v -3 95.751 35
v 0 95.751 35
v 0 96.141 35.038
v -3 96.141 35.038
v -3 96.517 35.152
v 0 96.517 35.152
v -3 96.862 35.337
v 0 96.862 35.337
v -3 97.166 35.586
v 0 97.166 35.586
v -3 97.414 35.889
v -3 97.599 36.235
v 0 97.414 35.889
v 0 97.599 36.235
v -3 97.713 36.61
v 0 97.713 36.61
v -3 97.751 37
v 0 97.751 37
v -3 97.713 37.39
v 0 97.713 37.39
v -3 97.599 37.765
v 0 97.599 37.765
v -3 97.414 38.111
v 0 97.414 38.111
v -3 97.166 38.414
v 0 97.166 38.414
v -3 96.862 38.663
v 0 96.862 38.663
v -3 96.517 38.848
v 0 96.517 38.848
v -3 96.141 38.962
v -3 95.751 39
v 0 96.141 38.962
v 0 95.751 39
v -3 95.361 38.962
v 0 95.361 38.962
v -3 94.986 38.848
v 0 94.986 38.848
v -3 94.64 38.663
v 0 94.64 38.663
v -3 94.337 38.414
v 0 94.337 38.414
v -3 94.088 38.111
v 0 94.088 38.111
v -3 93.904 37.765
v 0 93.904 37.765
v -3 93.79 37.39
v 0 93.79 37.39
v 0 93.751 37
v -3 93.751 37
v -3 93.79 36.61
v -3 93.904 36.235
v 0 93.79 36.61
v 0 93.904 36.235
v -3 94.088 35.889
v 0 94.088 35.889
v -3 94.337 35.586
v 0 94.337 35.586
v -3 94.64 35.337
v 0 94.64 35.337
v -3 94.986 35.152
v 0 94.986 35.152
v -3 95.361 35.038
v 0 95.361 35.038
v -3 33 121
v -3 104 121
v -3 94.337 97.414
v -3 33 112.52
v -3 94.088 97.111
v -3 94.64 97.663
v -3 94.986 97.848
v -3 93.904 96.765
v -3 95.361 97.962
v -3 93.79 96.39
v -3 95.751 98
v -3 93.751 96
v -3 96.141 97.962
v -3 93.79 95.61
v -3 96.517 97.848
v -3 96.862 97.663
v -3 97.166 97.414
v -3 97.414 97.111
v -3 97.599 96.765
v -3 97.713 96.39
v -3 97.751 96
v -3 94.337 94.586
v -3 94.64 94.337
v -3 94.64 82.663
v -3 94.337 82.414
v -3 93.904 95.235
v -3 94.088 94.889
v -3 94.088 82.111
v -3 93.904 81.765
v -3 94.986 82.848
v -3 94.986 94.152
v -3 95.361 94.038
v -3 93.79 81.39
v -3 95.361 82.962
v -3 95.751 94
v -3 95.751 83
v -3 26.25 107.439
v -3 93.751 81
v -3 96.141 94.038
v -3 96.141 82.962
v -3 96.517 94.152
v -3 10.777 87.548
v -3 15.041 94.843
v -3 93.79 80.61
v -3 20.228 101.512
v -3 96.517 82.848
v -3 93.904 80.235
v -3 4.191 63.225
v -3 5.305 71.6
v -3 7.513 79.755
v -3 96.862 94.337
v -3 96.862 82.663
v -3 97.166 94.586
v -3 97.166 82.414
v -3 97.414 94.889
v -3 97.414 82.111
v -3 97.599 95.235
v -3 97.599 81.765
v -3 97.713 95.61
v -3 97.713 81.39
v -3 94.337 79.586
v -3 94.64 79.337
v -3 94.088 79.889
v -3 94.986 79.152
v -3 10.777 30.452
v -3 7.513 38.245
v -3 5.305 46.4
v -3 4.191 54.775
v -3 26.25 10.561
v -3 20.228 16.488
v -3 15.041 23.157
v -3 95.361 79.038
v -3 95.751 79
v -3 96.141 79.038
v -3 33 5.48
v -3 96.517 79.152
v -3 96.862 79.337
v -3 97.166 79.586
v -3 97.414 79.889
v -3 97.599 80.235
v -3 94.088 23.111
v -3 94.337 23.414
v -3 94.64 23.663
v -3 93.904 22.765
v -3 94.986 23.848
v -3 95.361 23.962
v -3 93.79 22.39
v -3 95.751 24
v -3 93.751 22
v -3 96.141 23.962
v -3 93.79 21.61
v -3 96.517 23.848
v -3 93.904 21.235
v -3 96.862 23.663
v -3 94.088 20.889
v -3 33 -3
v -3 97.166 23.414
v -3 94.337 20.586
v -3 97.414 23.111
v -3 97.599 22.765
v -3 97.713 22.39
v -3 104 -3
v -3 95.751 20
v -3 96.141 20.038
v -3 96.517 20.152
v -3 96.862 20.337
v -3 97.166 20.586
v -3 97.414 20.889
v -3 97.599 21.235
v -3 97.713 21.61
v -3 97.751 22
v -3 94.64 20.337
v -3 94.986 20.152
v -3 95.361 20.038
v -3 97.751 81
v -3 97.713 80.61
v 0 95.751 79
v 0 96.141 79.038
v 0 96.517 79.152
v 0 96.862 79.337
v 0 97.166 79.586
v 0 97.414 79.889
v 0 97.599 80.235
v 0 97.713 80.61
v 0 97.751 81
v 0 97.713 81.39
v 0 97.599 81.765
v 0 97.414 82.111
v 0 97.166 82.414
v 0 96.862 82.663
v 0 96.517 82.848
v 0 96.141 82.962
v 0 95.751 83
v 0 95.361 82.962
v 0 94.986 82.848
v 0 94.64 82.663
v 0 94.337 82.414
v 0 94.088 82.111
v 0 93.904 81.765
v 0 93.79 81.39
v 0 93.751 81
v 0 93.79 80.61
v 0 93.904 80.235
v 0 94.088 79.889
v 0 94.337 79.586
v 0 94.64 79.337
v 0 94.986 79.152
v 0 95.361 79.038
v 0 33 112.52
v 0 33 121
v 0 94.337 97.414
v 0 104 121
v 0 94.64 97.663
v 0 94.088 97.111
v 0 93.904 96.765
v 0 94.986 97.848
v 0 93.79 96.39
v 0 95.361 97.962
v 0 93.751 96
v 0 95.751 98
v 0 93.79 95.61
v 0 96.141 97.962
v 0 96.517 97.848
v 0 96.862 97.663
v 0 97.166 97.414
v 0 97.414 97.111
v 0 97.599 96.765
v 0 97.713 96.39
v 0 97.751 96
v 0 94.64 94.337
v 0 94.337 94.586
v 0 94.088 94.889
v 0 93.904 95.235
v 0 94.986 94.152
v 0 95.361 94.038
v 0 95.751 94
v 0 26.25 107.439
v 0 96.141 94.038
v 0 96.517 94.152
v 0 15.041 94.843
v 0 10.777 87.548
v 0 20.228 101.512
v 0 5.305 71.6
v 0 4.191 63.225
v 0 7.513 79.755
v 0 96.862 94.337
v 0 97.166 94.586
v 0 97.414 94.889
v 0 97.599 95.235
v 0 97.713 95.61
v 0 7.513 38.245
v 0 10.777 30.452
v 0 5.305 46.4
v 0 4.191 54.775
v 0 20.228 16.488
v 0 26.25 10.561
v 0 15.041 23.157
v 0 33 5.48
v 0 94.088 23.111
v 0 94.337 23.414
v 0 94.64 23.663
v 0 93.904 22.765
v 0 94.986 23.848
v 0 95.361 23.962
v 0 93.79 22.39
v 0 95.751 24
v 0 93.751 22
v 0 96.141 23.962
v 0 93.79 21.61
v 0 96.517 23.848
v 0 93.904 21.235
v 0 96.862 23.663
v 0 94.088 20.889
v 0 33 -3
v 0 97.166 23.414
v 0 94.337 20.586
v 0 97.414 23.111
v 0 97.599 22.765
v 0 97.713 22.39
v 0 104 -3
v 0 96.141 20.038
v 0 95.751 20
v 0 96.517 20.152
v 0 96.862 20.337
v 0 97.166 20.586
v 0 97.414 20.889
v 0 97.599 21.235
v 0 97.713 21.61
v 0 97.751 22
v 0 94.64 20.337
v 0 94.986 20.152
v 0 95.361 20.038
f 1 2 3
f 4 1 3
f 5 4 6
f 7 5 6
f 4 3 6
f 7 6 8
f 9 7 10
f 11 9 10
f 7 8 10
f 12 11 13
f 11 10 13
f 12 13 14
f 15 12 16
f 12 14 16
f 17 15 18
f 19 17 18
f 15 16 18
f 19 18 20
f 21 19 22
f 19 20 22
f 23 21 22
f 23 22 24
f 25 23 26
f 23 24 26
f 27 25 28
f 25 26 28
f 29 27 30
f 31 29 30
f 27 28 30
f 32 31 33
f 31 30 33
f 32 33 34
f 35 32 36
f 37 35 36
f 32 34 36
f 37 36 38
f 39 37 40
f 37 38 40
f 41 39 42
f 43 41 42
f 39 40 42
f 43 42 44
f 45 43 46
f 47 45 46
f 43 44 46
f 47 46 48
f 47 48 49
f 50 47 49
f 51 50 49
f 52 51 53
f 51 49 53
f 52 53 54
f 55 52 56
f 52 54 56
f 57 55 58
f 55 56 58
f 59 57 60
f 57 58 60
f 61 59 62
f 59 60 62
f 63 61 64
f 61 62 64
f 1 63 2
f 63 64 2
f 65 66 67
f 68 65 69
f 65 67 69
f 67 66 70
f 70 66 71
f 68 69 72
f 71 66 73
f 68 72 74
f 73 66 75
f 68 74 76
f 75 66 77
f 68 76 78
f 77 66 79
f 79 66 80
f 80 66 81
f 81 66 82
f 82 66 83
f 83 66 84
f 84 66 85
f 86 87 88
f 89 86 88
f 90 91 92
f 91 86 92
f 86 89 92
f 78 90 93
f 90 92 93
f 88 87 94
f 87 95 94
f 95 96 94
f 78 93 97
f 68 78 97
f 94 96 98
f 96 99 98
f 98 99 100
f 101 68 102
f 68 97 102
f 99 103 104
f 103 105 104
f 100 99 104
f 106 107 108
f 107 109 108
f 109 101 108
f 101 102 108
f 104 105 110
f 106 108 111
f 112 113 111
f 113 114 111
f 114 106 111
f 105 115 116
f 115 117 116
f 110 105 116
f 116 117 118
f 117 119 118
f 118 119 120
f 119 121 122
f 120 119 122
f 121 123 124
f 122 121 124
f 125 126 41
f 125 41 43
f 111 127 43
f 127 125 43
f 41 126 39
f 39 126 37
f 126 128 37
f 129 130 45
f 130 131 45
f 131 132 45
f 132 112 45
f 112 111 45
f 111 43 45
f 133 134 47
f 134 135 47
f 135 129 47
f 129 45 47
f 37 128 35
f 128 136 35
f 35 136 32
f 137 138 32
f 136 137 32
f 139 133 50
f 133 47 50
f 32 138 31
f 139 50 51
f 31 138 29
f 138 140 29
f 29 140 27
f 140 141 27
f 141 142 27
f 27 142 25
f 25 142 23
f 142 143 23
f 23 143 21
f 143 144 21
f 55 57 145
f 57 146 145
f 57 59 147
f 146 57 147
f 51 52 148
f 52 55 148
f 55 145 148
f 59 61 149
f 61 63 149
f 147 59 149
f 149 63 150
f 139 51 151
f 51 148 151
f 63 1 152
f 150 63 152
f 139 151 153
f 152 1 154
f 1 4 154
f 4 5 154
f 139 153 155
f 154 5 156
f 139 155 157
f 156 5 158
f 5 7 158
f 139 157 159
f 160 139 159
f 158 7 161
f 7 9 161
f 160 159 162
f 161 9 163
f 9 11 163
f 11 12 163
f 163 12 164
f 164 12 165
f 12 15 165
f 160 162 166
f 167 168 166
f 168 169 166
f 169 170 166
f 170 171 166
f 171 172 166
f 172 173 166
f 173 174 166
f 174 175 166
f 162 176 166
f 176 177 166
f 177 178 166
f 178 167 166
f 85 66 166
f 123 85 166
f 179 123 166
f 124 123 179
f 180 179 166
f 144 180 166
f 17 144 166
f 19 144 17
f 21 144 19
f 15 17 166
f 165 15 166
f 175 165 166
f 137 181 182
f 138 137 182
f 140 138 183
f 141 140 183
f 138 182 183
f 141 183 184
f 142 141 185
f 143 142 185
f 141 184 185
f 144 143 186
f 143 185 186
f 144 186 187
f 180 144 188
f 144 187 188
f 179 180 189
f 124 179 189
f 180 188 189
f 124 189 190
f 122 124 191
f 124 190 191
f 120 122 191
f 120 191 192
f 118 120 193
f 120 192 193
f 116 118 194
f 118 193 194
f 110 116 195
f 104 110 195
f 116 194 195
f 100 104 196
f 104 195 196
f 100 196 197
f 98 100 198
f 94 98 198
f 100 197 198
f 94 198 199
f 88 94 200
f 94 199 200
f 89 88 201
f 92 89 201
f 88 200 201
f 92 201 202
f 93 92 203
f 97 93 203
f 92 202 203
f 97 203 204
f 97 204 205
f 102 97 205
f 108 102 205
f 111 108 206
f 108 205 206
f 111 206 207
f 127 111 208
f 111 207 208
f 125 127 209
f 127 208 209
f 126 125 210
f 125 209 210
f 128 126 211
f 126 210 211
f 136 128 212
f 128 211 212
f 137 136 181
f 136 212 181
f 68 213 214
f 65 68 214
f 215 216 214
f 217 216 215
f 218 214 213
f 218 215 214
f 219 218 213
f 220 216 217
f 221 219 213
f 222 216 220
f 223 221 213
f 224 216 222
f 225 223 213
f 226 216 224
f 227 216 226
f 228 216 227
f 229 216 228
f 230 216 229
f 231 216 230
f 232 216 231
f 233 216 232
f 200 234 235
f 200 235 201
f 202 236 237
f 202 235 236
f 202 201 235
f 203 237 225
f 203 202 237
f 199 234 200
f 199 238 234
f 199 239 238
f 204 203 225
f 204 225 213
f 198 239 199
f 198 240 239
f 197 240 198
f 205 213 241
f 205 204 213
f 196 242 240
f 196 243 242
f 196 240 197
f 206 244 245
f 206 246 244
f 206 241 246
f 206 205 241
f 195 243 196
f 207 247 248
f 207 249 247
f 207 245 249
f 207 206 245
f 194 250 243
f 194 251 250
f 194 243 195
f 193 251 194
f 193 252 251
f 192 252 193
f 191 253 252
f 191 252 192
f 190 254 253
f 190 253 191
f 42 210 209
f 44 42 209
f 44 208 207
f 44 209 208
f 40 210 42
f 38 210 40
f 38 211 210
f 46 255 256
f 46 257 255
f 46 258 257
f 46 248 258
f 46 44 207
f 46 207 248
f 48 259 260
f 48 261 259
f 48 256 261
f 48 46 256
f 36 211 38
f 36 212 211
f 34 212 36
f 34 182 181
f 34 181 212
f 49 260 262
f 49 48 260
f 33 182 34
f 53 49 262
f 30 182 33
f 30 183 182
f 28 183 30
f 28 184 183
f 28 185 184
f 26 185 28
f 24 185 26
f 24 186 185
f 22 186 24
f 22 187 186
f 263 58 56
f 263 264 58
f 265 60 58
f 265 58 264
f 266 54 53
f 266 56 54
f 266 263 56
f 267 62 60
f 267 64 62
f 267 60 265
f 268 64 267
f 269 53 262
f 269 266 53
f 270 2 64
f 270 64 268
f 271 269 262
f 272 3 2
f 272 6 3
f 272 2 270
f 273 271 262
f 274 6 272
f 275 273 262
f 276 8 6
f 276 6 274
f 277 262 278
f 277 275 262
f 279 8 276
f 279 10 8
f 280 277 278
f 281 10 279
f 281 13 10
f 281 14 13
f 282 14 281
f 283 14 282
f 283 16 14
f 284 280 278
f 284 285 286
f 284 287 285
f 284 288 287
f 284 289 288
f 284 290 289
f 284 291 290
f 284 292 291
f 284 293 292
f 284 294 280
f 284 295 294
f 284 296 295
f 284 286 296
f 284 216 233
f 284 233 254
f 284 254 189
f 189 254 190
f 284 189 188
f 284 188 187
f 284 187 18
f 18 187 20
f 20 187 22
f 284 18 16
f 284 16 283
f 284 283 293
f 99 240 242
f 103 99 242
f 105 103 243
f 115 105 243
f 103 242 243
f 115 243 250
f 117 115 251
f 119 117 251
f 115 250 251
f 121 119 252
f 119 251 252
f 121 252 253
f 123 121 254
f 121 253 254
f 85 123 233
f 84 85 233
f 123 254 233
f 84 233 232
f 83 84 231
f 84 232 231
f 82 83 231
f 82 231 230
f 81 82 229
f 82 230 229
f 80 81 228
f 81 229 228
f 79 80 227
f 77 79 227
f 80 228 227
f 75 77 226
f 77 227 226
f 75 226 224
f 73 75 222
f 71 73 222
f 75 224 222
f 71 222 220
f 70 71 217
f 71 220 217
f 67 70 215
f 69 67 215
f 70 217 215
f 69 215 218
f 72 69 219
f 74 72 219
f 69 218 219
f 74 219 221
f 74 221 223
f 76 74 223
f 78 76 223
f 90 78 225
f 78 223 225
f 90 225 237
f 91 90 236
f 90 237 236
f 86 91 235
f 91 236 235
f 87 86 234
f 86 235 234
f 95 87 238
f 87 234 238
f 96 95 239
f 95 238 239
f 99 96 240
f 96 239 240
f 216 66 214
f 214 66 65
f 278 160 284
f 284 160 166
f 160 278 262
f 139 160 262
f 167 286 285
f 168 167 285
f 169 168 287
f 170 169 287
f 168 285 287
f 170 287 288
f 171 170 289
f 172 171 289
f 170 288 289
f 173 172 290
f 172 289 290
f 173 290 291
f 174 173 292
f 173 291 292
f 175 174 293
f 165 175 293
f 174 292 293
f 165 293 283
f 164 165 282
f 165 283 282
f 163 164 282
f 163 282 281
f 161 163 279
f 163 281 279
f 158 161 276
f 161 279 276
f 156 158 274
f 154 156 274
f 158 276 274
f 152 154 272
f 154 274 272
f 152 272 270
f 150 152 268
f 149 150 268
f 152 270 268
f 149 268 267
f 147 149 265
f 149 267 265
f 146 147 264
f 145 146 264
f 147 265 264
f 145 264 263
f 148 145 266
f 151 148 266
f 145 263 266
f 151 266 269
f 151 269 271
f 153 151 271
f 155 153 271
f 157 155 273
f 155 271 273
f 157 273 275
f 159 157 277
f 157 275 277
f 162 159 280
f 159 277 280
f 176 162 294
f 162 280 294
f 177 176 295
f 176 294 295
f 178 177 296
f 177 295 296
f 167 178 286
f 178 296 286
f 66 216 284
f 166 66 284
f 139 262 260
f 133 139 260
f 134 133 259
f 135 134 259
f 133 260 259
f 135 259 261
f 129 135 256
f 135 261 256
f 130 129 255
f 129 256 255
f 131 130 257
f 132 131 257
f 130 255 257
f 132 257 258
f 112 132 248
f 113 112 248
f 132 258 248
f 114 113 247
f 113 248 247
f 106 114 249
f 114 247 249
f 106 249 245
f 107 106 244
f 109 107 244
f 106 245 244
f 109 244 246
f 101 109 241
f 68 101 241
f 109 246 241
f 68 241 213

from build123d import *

# Parameters (mm, degrees)
IMPORTED_START          = -3
IMPORTED_BODY_4_1_DEPTH = 3
SKETCH_1_R              = 2
CUT_EXTRUDE_1_DEPTH     = 3
SKETCH_2_W              = 30
SKETCH_2_H              = 3
SKETCH_2_W_2            = 3
SKETCH_2_H_2            = 30
EXTRUDE_1_DEPTH         = 3
CUT_EXTRUDE_2_DEPTH     = 3


# Read off the part's stored shape, not the designer's step: 基体零件-零件4-1
with BuildPart() as part:
    # 基体零件-零件4-1 outline → 基体零件-零件4-1 (new body)
    with BuildSketch(Plane.YZ.offset(IMPORTED_START)):
        Polygon((-3, -3), (0, -3), (0, 0), (9.999598957, 0), (9.999598957, 3), (20.000401043, 3), (20.000401043, 0), (30, 0), (30, -3), (52, -3), (52, 0), (82, 0), (82, -3), (104, -3), (104, 19), (101, 19), (101, 49), (104, 49), (104, 69), (101, 69), (101, 99), (104, 99), (104, 121), (82, 121), (82, 118), (52, 118), (52, 121), (30, 121), (30, 118), (20.000401043, 118), (20.000401043, 115), (9.999598957, 115), (9.999598957, 118), (0, 118), (0, 121), (-3, 121), (-3, 99), (0, 99), (0, 69), (-3, 69), (-3, 49), (0, 49), (0, 19), (-3, 19), align=None)
    extrude(amount=IMPORTED_BODY_4_1_DEPTH)

    # 草图1 → 切除-拉伸1 (cut)
    with BuildSketch(Plane(origin=(0, 0, 0), x_dir=(0, 0, -1), z_dir=(1, 0, 0))):
        with Locations((-96, 95.751318052)):
            Circle(SKETCH_1_R)
        with Locations((-81, 95.751318052)):
            Circle(SKETCH_1_R)
        with Locations((-37, 95.751318052)):
            Circle(SKETCH_1_R)
        with Locations((-22, 95.751318052)):
            Circle(SKETCH_1_R)
    extrude(amount=-CUT_EXTRUDE_1_DEPTH, mode=Mode.SUBTRACT)

    # 草图2 → 凸台-拉伸1 (add)
    with BuildSketch(Plane(origin=(0, 0, 0), x_dir=(0, 0, -1), z_dir=(1, 0, 0))):
        with Locations((-84, 102.5)):
            Rectangle(SKETCH_2_W, SKETCH_2_H)
        with Locations((-34, 102.5)):
            Rectangle(SKETCH_2_W, SKETCH_2_H)
        with Locations((-119.5, 67)):
            Rectangle(SKETCH_2_W_2, SKETCH_2_H_2)
        with Locations((1.5, 67)):
            Rectangle(SKETCH_2_W_2, SKETCH_2_H_2)
    extrude(amount=-EXTRUDE_1_DEPTH)

    # 草图3 → 切除-拉伸2 (cut)
    with BuildSketch(Plane(origin=(0, 0, 0), x_dir=(0, 0, -1), z_dir=(1, 0, 0))):
        with BuildLine():
            Line((-112.520298482, 33), (-121, 33))
            Line((-121, 33), (-121, -3))
            Line((-121, -3), (3, -3))
            Line((3, -3), (3, 33))
            Line((3, 33), (-5.479701518, 33))
            ThreePointArc((-5.479701518, 33), (-59, 4.051408541), (-112.520298482, 33))
        make_face()
    extrude(amount=-CUT_EXTRUDE_2_DEPTH, mode=Mode.SUBTRACT)


solid = part.part
